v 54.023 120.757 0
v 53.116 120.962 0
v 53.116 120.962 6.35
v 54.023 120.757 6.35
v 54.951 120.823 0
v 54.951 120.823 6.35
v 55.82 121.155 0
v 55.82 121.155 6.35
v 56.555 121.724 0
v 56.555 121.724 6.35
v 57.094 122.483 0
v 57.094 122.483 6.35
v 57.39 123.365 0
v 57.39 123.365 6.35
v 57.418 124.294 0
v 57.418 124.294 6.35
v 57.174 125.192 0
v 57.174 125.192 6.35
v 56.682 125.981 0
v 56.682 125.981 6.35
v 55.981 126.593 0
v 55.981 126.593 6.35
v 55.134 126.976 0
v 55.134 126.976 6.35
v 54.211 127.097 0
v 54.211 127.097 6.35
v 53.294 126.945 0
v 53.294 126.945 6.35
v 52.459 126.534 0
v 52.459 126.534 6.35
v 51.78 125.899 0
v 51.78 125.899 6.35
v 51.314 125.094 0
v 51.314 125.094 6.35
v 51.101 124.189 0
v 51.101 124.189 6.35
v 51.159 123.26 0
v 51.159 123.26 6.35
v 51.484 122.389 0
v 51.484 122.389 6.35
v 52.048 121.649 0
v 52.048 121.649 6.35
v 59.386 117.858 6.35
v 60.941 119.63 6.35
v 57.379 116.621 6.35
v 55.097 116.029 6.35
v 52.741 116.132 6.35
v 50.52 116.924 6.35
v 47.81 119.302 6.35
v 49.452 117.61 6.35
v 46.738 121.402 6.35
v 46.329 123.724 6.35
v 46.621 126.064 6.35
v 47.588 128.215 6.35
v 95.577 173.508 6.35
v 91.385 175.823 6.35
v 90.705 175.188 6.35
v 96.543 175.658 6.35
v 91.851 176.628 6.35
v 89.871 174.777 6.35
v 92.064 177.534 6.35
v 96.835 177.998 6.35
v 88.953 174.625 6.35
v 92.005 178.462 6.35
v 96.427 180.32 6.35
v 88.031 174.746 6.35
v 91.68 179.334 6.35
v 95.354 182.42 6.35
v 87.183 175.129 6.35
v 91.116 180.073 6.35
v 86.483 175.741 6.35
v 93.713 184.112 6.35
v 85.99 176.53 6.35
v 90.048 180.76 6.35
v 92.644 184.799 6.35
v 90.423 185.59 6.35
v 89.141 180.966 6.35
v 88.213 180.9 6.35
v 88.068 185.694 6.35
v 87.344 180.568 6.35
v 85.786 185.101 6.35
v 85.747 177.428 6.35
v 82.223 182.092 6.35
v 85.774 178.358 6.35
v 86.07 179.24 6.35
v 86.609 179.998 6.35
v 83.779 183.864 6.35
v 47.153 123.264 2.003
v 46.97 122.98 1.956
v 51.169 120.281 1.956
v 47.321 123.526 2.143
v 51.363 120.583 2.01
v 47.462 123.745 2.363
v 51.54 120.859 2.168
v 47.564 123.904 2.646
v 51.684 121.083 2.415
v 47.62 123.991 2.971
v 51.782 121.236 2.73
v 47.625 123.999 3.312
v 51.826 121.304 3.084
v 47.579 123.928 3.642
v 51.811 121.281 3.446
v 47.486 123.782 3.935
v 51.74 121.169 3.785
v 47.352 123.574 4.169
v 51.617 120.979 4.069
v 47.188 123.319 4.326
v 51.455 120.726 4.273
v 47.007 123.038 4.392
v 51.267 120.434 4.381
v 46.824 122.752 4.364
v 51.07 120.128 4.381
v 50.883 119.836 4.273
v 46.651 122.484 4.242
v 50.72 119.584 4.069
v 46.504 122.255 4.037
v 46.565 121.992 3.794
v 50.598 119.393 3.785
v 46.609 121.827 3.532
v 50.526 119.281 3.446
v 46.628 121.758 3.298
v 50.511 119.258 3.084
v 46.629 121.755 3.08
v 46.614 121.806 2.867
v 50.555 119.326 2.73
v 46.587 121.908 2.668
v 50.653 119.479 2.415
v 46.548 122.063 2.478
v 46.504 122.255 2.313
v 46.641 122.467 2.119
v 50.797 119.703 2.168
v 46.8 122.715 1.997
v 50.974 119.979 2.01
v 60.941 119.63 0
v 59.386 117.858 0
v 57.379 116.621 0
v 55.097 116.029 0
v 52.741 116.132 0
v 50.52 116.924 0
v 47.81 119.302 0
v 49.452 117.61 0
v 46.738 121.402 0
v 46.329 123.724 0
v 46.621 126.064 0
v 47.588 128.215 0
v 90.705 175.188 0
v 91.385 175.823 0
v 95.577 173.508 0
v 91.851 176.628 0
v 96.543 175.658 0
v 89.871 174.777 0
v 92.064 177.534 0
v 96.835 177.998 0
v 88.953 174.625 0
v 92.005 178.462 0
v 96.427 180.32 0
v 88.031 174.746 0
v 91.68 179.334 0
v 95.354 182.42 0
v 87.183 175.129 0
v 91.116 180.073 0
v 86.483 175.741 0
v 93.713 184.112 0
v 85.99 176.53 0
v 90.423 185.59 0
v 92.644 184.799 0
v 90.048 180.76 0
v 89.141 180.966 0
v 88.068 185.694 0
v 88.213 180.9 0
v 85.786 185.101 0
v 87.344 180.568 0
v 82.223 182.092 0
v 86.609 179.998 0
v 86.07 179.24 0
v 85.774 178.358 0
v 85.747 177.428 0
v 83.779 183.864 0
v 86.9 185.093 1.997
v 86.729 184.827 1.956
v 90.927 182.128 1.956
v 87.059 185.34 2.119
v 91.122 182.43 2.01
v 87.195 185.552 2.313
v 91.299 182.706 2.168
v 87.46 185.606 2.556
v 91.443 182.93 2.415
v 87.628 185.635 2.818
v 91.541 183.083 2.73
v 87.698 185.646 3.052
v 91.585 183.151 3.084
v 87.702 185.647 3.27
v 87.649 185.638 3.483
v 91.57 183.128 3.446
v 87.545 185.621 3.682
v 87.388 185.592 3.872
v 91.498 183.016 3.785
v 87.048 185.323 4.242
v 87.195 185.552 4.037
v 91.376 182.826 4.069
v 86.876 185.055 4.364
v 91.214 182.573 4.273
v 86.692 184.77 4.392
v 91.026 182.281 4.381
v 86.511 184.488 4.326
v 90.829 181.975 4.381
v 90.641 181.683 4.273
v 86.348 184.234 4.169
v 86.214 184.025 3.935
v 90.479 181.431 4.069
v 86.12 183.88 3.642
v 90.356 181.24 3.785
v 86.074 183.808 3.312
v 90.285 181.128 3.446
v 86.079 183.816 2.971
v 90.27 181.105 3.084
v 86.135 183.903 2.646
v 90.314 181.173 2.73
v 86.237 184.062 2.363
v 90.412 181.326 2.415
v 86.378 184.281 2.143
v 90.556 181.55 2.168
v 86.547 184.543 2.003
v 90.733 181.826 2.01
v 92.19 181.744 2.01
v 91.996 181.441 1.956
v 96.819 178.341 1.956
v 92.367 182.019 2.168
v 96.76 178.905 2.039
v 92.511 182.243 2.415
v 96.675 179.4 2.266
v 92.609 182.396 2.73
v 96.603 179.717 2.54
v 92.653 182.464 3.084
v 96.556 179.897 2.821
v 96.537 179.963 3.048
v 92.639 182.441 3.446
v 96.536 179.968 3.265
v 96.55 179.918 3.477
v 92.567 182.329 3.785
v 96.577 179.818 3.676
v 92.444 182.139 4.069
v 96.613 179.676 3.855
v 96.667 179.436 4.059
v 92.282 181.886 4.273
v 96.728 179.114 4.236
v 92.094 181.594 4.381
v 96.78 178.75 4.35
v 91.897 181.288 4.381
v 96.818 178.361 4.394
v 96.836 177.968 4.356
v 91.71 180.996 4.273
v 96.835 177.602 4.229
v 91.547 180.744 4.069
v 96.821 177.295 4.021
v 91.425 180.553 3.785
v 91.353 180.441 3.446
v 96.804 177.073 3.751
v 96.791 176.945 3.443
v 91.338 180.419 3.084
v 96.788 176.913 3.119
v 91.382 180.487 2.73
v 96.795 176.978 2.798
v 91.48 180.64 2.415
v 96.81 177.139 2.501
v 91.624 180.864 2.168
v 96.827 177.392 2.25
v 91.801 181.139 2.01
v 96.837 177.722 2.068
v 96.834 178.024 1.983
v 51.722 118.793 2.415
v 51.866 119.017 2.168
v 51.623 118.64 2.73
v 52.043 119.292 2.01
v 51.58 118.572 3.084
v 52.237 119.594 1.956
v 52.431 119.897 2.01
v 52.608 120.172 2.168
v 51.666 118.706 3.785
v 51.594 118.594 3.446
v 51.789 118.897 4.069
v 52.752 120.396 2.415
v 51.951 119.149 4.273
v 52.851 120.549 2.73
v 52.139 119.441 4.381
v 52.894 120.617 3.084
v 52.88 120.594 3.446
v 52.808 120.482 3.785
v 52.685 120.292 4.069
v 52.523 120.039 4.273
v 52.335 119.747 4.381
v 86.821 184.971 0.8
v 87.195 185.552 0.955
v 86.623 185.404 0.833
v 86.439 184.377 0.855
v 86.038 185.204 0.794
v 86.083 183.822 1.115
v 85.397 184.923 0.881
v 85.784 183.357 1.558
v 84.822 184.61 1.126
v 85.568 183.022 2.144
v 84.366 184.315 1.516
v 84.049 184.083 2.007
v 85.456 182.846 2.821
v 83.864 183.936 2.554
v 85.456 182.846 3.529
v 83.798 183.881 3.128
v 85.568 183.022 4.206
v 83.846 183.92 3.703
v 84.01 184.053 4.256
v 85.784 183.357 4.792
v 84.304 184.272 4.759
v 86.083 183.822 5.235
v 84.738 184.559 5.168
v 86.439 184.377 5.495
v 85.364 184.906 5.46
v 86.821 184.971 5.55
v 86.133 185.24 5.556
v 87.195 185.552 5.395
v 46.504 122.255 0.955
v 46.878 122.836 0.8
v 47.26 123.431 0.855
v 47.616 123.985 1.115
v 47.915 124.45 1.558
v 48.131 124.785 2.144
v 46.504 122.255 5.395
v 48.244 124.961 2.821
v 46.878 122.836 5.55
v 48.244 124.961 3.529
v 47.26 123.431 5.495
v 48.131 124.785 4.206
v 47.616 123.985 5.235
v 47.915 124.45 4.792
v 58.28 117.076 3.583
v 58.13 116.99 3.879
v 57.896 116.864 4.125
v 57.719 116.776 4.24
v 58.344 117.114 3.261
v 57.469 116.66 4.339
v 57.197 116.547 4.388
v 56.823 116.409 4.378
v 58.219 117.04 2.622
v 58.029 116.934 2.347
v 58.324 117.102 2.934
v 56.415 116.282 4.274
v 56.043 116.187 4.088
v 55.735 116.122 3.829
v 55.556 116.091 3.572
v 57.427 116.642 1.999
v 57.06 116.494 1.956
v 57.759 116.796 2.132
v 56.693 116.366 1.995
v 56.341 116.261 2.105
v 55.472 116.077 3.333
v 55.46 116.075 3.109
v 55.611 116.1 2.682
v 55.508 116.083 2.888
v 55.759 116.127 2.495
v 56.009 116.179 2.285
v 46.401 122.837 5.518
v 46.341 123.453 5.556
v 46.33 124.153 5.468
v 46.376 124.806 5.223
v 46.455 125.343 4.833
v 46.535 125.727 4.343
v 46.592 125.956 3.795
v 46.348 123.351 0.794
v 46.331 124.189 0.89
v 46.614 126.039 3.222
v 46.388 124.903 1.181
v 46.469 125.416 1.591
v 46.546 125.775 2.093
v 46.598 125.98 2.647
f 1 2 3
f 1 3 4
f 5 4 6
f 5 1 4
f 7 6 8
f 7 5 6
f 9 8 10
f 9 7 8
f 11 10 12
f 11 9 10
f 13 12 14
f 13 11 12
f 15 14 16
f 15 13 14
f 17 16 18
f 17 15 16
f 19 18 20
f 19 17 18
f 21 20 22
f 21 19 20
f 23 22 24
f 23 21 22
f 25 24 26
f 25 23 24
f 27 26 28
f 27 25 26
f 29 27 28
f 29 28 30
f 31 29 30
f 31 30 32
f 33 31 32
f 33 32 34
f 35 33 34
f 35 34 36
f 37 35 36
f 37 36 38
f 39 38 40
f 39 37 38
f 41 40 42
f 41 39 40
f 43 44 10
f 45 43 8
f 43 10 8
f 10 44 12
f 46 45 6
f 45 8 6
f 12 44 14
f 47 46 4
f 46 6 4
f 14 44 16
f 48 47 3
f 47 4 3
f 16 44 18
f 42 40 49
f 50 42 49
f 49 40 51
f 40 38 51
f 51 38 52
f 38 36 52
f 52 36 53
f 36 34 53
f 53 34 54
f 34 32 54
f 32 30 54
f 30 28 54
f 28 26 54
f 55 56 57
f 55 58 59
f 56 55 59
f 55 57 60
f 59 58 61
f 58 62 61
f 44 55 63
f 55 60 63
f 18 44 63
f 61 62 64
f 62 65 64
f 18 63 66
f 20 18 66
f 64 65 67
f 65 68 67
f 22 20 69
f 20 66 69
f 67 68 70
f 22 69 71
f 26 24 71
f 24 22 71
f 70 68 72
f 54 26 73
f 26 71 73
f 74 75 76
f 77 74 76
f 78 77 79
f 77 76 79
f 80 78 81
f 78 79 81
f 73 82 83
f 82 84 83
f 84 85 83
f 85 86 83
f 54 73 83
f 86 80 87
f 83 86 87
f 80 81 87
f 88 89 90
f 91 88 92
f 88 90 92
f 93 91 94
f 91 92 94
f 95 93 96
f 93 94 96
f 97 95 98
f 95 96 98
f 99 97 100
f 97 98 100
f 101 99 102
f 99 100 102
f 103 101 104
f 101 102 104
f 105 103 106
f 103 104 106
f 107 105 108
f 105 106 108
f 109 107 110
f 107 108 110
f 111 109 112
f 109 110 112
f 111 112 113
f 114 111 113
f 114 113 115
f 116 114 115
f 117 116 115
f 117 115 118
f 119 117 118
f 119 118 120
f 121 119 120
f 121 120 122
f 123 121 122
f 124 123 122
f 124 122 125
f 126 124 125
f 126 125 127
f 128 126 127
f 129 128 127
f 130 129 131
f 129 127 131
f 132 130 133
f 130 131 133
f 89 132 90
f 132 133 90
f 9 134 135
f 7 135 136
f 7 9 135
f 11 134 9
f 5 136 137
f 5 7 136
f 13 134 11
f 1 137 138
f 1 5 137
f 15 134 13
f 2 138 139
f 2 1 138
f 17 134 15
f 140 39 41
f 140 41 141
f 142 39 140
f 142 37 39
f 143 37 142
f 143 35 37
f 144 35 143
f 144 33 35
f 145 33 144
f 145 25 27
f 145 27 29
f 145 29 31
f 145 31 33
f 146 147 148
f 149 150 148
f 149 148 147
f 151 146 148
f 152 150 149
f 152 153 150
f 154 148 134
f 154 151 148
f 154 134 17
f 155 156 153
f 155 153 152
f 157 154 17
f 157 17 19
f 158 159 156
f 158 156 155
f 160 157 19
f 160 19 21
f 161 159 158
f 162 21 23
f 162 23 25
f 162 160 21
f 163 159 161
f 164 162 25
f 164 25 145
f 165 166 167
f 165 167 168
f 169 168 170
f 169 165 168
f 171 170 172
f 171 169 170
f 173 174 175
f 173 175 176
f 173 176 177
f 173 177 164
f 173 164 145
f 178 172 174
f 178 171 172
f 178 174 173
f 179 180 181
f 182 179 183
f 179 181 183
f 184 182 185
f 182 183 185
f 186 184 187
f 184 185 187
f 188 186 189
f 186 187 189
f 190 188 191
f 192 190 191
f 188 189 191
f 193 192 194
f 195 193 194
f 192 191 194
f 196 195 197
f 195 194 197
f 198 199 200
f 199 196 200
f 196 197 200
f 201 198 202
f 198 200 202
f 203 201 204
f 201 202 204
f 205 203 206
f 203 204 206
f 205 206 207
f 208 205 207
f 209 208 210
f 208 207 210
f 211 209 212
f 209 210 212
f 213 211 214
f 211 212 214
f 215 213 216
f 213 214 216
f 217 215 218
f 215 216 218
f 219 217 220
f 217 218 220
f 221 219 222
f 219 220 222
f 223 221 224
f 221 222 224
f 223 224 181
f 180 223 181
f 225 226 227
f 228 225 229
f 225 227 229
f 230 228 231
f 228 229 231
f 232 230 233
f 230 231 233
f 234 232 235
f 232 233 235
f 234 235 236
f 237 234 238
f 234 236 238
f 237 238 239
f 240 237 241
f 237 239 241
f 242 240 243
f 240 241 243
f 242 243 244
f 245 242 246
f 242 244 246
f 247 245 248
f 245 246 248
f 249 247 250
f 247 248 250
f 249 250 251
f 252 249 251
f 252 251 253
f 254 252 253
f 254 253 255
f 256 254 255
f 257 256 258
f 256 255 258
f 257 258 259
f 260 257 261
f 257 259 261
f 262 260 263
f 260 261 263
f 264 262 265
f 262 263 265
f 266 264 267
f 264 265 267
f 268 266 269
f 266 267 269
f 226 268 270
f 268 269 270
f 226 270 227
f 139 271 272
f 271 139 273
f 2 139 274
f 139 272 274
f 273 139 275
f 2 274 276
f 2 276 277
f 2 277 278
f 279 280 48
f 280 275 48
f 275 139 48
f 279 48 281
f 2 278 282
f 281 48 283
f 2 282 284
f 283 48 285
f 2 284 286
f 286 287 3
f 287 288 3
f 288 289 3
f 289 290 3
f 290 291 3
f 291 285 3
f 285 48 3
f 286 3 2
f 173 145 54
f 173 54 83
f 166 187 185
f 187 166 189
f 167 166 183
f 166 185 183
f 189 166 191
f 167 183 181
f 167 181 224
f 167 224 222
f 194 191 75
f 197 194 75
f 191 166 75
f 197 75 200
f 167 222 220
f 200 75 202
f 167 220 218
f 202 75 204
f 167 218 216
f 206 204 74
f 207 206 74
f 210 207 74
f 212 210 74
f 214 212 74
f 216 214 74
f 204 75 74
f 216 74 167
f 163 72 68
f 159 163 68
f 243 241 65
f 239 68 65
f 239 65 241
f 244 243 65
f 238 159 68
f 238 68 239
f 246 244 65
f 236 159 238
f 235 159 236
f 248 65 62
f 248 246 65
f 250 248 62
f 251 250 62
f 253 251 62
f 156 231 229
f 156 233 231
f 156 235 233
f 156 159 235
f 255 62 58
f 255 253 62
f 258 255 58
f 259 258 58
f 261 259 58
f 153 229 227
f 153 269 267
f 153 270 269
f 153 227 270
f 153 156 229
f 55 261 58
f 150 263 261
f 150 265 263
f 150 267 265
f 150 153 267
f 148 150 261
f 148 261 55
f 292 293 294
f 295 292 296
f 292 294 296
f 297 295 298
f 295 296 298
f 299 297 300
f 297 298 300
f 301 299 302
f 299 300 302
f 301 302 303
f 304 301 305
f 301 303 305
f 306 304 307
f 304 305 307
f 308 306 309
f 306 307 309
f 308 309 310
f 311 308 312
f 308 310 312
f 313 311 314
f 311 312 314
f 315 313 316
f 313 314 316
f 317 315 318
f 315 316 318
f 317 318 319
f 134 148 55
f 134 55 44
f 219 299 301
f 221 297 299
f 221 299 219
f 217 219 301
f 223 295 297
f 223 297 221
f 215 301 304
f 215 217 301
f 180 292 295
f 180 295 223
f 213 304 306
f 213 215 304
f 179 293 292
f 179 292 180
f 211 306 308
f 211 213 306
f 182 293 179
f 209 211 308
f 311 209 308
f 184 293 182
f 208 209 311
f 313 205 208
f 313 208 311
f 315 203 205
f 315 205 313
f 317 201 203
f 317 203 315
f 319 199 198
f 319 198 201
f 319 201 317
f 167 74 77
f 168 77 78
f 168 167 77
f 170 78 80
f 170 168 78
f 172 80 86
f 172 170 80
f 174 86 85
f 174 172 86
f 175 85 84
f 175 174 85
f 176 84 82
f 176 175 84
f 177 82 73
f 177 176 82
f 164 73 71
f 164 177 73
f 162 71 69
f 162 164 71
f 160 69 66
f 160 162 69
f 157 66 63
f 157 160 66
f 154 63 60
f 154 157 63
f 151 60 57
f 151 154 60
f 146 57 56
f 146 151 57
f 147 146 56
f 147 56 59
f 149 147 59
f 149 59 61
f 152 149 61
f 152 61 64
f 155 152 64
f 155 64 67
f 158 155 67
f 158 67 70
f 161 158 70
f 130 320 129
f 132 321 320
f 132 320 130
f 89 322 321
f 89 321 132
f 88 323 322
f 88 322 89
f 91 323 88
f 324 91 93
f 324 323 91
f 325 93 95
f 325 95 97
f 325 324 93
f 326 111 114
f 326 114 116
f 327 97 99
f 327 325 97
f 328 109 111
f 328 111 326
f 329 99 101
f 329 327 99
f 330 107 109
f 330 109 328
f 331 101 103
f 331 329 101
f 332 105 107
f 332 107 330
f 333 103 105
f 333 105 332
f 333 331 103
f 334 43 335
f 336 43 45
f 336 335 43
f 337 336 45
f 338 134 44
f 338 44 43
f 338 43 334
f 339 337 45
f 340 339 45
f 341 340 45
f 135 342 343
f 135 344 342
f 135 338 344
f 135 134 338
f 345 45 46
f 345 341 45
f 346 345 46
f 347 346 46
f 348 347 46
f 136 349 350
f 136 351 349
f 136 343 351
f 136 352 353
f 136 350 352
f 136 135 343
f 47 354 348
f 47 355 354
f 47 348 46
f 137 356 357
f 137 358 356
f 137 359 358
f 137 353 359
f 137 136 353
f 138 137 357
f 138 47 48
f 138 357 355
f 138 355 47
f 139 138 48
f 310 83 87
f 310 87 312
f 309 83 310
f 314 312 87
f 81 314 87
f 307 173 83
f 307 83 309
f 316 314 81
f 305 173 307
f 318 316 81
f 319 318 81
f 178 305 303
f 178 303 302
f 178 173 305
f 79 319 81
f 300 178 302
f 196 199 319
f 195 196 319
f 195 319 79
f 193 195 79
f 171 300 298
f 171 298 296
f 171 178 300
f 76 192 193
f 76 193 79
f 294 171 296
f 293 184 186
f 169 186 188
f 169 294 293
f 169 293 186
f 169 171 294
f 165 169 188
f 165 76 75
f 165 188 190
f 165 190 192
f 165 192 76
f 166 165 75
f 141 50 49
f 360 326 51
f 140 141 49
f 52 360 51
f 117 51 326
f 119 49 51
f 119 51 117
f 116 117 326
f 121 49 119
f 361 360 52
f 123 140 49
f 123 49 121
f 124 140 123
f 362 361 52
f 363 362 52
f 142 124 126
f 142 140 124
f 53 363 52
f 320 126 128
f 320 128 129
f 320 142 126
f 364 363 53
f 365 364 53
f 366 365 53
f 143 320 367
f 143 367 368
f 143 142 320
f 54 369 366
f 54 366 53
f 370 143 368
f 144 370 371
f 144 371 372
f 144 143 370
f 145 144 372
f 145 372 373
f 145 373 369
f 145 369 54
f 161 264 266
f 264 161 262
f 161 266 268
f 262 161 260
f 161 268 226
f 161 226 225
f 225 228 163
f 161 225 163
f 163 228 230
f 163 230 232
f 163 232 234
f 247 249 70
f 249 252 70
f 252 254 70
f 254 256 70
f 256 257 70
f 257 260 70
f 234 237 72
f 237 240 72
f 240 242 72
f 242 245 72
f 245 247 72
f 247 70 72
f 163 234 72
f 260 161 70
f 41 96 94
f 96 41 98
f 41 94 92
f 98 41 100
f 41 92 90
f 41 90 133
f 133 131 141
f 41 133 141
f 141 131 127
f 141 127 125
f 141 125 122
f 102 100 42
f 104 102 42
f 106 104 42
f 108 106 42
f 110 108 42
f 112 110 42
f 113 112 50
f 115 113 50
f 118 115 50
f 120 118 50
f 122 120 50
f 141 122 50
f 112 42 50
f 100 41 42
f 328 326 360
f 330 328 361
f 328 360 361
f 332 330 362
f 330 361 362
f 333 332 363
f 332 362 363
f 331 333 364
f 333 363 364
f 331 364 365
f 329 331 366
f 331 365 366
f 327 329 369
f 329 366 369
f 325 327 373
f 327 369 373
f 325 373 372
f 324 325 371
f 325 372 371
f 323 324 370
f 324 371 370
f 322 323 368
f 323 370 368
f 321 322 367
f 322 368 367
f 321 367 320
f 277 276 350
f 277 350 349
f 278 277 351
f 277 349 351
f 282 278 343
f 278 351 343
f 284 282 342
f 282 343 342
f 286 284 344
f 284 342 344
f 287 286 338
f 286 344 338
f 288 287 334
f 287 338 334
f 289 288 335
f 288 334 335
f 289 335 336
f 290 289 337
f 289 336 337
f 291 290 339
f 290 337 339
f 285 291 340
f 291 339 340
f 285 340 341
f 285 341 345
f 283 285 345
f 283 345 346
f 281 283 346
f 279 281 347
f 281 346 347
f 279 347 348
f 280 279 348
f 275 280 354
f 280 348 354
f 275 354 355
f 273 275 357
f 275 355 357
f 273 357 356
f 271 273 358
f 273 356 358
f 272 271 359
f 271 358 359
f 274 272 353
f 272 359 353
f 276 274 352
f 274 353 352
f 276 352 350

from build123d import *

# Parameters (mm, degrees)
SKETCH1_R                 = 3.175
BOSS_EXTRUDE1_DEPTH       = 6.35
CUT_EXTRUDE1_DEPTH        = 210.56202617
CBORE_FOR_2_1_D           = 2.4384
CBORE_FOR_2_1_CBORE_D     = 4.7625
CBORE_FOR_2_1_CBORE_DEPTH = 2.3114


with BuildPart() as part:
    # Sketch1 → Boss-Extrude1 (new body)
    with BuildSketch(Plane.XY):
        with BuildLine():
            Line((47.587554204, 128.214676374), (82.223145852, 182.092263381))
            ThreePointArc((82.223145852, 182.092263381), (93.192263381, 184.476854148), (95.576854148, 173.507736619))
            Line((95.576854148, 173.507736619), (60.941262501, 119.630149611))
            ThreePointArc((60.941262501, 119.630149611), (49.972144971, 117.245558844), (47.587554204, 128.214676374))
        make_face()
        with Locations((88.9, 177.8)):
            Circle(SKETCH1_R, mode=Mode.SUBTRACT)
        with Locations((54.264408352, 123.922412992)):
            Circle(SKETCH1_R, mode=Mode.SUBTRACT)
    extrude(amount=BOSS_EXTRUDE1_DEPTH)

    # Sketch2 → Cut-Extrude1 (cut, through all)
    with BuildSketch(Plane.XY.offset(6.35)):
        with BuildLine():
            Line((92.644357759, 184.79883499), (90.048068488, 180.760162791))
            ThreePointArc((90.048068488, 180.760162791), (90.616905352, 180.470741659), (91.116365152, 180.07340065))
            Line((91.116365152, 180.07340065), (93.712654423, 184.112072849))
            ThreePointArc((93.712654423, 184.112072849), (93.192263381, 184.476854148), (92.644357759, 184.79883499))
        make_face()
        with BuildLine():
            Line((52.0480432, 121.649012343), (49.451753929, 117.610340143))
            ThreePointArc((49.451753929, 117.610340143), (49.972144971, 117.245558844), (50.520050593, 116.923578002))
            Line((50.520050593, 116.923578002), (53.116339864, 120.962250202))
            ThreePointArc((53.116339864, 120.962250202), (52.547503, 121.251671333), (52.0480432, 121.649012343))
        make_face()
    extrude(amount=-CUT_EXTRUDE1_DEPTH, mode=Mode.SUBTRACT)

    # CBORE for #2 _1 (through all)
    with Locations(Plane(origin=(-24.649417325, 15.846053995, 0), x_dir=(0, 0, 1), z_dir=(-0.8411784753765535, 0.540757591313499, 0))):
        with Locations((3.175, 202.371942019), (3.175, 128.847697951)):
            CounterBoreHole(CBORE_FOR_2_1_D / 2, CBORE_FOR_2_1_CBORE_D / 2, CBORE_FOR_2_1_CBORE_DEPTH)


solid = part.part
